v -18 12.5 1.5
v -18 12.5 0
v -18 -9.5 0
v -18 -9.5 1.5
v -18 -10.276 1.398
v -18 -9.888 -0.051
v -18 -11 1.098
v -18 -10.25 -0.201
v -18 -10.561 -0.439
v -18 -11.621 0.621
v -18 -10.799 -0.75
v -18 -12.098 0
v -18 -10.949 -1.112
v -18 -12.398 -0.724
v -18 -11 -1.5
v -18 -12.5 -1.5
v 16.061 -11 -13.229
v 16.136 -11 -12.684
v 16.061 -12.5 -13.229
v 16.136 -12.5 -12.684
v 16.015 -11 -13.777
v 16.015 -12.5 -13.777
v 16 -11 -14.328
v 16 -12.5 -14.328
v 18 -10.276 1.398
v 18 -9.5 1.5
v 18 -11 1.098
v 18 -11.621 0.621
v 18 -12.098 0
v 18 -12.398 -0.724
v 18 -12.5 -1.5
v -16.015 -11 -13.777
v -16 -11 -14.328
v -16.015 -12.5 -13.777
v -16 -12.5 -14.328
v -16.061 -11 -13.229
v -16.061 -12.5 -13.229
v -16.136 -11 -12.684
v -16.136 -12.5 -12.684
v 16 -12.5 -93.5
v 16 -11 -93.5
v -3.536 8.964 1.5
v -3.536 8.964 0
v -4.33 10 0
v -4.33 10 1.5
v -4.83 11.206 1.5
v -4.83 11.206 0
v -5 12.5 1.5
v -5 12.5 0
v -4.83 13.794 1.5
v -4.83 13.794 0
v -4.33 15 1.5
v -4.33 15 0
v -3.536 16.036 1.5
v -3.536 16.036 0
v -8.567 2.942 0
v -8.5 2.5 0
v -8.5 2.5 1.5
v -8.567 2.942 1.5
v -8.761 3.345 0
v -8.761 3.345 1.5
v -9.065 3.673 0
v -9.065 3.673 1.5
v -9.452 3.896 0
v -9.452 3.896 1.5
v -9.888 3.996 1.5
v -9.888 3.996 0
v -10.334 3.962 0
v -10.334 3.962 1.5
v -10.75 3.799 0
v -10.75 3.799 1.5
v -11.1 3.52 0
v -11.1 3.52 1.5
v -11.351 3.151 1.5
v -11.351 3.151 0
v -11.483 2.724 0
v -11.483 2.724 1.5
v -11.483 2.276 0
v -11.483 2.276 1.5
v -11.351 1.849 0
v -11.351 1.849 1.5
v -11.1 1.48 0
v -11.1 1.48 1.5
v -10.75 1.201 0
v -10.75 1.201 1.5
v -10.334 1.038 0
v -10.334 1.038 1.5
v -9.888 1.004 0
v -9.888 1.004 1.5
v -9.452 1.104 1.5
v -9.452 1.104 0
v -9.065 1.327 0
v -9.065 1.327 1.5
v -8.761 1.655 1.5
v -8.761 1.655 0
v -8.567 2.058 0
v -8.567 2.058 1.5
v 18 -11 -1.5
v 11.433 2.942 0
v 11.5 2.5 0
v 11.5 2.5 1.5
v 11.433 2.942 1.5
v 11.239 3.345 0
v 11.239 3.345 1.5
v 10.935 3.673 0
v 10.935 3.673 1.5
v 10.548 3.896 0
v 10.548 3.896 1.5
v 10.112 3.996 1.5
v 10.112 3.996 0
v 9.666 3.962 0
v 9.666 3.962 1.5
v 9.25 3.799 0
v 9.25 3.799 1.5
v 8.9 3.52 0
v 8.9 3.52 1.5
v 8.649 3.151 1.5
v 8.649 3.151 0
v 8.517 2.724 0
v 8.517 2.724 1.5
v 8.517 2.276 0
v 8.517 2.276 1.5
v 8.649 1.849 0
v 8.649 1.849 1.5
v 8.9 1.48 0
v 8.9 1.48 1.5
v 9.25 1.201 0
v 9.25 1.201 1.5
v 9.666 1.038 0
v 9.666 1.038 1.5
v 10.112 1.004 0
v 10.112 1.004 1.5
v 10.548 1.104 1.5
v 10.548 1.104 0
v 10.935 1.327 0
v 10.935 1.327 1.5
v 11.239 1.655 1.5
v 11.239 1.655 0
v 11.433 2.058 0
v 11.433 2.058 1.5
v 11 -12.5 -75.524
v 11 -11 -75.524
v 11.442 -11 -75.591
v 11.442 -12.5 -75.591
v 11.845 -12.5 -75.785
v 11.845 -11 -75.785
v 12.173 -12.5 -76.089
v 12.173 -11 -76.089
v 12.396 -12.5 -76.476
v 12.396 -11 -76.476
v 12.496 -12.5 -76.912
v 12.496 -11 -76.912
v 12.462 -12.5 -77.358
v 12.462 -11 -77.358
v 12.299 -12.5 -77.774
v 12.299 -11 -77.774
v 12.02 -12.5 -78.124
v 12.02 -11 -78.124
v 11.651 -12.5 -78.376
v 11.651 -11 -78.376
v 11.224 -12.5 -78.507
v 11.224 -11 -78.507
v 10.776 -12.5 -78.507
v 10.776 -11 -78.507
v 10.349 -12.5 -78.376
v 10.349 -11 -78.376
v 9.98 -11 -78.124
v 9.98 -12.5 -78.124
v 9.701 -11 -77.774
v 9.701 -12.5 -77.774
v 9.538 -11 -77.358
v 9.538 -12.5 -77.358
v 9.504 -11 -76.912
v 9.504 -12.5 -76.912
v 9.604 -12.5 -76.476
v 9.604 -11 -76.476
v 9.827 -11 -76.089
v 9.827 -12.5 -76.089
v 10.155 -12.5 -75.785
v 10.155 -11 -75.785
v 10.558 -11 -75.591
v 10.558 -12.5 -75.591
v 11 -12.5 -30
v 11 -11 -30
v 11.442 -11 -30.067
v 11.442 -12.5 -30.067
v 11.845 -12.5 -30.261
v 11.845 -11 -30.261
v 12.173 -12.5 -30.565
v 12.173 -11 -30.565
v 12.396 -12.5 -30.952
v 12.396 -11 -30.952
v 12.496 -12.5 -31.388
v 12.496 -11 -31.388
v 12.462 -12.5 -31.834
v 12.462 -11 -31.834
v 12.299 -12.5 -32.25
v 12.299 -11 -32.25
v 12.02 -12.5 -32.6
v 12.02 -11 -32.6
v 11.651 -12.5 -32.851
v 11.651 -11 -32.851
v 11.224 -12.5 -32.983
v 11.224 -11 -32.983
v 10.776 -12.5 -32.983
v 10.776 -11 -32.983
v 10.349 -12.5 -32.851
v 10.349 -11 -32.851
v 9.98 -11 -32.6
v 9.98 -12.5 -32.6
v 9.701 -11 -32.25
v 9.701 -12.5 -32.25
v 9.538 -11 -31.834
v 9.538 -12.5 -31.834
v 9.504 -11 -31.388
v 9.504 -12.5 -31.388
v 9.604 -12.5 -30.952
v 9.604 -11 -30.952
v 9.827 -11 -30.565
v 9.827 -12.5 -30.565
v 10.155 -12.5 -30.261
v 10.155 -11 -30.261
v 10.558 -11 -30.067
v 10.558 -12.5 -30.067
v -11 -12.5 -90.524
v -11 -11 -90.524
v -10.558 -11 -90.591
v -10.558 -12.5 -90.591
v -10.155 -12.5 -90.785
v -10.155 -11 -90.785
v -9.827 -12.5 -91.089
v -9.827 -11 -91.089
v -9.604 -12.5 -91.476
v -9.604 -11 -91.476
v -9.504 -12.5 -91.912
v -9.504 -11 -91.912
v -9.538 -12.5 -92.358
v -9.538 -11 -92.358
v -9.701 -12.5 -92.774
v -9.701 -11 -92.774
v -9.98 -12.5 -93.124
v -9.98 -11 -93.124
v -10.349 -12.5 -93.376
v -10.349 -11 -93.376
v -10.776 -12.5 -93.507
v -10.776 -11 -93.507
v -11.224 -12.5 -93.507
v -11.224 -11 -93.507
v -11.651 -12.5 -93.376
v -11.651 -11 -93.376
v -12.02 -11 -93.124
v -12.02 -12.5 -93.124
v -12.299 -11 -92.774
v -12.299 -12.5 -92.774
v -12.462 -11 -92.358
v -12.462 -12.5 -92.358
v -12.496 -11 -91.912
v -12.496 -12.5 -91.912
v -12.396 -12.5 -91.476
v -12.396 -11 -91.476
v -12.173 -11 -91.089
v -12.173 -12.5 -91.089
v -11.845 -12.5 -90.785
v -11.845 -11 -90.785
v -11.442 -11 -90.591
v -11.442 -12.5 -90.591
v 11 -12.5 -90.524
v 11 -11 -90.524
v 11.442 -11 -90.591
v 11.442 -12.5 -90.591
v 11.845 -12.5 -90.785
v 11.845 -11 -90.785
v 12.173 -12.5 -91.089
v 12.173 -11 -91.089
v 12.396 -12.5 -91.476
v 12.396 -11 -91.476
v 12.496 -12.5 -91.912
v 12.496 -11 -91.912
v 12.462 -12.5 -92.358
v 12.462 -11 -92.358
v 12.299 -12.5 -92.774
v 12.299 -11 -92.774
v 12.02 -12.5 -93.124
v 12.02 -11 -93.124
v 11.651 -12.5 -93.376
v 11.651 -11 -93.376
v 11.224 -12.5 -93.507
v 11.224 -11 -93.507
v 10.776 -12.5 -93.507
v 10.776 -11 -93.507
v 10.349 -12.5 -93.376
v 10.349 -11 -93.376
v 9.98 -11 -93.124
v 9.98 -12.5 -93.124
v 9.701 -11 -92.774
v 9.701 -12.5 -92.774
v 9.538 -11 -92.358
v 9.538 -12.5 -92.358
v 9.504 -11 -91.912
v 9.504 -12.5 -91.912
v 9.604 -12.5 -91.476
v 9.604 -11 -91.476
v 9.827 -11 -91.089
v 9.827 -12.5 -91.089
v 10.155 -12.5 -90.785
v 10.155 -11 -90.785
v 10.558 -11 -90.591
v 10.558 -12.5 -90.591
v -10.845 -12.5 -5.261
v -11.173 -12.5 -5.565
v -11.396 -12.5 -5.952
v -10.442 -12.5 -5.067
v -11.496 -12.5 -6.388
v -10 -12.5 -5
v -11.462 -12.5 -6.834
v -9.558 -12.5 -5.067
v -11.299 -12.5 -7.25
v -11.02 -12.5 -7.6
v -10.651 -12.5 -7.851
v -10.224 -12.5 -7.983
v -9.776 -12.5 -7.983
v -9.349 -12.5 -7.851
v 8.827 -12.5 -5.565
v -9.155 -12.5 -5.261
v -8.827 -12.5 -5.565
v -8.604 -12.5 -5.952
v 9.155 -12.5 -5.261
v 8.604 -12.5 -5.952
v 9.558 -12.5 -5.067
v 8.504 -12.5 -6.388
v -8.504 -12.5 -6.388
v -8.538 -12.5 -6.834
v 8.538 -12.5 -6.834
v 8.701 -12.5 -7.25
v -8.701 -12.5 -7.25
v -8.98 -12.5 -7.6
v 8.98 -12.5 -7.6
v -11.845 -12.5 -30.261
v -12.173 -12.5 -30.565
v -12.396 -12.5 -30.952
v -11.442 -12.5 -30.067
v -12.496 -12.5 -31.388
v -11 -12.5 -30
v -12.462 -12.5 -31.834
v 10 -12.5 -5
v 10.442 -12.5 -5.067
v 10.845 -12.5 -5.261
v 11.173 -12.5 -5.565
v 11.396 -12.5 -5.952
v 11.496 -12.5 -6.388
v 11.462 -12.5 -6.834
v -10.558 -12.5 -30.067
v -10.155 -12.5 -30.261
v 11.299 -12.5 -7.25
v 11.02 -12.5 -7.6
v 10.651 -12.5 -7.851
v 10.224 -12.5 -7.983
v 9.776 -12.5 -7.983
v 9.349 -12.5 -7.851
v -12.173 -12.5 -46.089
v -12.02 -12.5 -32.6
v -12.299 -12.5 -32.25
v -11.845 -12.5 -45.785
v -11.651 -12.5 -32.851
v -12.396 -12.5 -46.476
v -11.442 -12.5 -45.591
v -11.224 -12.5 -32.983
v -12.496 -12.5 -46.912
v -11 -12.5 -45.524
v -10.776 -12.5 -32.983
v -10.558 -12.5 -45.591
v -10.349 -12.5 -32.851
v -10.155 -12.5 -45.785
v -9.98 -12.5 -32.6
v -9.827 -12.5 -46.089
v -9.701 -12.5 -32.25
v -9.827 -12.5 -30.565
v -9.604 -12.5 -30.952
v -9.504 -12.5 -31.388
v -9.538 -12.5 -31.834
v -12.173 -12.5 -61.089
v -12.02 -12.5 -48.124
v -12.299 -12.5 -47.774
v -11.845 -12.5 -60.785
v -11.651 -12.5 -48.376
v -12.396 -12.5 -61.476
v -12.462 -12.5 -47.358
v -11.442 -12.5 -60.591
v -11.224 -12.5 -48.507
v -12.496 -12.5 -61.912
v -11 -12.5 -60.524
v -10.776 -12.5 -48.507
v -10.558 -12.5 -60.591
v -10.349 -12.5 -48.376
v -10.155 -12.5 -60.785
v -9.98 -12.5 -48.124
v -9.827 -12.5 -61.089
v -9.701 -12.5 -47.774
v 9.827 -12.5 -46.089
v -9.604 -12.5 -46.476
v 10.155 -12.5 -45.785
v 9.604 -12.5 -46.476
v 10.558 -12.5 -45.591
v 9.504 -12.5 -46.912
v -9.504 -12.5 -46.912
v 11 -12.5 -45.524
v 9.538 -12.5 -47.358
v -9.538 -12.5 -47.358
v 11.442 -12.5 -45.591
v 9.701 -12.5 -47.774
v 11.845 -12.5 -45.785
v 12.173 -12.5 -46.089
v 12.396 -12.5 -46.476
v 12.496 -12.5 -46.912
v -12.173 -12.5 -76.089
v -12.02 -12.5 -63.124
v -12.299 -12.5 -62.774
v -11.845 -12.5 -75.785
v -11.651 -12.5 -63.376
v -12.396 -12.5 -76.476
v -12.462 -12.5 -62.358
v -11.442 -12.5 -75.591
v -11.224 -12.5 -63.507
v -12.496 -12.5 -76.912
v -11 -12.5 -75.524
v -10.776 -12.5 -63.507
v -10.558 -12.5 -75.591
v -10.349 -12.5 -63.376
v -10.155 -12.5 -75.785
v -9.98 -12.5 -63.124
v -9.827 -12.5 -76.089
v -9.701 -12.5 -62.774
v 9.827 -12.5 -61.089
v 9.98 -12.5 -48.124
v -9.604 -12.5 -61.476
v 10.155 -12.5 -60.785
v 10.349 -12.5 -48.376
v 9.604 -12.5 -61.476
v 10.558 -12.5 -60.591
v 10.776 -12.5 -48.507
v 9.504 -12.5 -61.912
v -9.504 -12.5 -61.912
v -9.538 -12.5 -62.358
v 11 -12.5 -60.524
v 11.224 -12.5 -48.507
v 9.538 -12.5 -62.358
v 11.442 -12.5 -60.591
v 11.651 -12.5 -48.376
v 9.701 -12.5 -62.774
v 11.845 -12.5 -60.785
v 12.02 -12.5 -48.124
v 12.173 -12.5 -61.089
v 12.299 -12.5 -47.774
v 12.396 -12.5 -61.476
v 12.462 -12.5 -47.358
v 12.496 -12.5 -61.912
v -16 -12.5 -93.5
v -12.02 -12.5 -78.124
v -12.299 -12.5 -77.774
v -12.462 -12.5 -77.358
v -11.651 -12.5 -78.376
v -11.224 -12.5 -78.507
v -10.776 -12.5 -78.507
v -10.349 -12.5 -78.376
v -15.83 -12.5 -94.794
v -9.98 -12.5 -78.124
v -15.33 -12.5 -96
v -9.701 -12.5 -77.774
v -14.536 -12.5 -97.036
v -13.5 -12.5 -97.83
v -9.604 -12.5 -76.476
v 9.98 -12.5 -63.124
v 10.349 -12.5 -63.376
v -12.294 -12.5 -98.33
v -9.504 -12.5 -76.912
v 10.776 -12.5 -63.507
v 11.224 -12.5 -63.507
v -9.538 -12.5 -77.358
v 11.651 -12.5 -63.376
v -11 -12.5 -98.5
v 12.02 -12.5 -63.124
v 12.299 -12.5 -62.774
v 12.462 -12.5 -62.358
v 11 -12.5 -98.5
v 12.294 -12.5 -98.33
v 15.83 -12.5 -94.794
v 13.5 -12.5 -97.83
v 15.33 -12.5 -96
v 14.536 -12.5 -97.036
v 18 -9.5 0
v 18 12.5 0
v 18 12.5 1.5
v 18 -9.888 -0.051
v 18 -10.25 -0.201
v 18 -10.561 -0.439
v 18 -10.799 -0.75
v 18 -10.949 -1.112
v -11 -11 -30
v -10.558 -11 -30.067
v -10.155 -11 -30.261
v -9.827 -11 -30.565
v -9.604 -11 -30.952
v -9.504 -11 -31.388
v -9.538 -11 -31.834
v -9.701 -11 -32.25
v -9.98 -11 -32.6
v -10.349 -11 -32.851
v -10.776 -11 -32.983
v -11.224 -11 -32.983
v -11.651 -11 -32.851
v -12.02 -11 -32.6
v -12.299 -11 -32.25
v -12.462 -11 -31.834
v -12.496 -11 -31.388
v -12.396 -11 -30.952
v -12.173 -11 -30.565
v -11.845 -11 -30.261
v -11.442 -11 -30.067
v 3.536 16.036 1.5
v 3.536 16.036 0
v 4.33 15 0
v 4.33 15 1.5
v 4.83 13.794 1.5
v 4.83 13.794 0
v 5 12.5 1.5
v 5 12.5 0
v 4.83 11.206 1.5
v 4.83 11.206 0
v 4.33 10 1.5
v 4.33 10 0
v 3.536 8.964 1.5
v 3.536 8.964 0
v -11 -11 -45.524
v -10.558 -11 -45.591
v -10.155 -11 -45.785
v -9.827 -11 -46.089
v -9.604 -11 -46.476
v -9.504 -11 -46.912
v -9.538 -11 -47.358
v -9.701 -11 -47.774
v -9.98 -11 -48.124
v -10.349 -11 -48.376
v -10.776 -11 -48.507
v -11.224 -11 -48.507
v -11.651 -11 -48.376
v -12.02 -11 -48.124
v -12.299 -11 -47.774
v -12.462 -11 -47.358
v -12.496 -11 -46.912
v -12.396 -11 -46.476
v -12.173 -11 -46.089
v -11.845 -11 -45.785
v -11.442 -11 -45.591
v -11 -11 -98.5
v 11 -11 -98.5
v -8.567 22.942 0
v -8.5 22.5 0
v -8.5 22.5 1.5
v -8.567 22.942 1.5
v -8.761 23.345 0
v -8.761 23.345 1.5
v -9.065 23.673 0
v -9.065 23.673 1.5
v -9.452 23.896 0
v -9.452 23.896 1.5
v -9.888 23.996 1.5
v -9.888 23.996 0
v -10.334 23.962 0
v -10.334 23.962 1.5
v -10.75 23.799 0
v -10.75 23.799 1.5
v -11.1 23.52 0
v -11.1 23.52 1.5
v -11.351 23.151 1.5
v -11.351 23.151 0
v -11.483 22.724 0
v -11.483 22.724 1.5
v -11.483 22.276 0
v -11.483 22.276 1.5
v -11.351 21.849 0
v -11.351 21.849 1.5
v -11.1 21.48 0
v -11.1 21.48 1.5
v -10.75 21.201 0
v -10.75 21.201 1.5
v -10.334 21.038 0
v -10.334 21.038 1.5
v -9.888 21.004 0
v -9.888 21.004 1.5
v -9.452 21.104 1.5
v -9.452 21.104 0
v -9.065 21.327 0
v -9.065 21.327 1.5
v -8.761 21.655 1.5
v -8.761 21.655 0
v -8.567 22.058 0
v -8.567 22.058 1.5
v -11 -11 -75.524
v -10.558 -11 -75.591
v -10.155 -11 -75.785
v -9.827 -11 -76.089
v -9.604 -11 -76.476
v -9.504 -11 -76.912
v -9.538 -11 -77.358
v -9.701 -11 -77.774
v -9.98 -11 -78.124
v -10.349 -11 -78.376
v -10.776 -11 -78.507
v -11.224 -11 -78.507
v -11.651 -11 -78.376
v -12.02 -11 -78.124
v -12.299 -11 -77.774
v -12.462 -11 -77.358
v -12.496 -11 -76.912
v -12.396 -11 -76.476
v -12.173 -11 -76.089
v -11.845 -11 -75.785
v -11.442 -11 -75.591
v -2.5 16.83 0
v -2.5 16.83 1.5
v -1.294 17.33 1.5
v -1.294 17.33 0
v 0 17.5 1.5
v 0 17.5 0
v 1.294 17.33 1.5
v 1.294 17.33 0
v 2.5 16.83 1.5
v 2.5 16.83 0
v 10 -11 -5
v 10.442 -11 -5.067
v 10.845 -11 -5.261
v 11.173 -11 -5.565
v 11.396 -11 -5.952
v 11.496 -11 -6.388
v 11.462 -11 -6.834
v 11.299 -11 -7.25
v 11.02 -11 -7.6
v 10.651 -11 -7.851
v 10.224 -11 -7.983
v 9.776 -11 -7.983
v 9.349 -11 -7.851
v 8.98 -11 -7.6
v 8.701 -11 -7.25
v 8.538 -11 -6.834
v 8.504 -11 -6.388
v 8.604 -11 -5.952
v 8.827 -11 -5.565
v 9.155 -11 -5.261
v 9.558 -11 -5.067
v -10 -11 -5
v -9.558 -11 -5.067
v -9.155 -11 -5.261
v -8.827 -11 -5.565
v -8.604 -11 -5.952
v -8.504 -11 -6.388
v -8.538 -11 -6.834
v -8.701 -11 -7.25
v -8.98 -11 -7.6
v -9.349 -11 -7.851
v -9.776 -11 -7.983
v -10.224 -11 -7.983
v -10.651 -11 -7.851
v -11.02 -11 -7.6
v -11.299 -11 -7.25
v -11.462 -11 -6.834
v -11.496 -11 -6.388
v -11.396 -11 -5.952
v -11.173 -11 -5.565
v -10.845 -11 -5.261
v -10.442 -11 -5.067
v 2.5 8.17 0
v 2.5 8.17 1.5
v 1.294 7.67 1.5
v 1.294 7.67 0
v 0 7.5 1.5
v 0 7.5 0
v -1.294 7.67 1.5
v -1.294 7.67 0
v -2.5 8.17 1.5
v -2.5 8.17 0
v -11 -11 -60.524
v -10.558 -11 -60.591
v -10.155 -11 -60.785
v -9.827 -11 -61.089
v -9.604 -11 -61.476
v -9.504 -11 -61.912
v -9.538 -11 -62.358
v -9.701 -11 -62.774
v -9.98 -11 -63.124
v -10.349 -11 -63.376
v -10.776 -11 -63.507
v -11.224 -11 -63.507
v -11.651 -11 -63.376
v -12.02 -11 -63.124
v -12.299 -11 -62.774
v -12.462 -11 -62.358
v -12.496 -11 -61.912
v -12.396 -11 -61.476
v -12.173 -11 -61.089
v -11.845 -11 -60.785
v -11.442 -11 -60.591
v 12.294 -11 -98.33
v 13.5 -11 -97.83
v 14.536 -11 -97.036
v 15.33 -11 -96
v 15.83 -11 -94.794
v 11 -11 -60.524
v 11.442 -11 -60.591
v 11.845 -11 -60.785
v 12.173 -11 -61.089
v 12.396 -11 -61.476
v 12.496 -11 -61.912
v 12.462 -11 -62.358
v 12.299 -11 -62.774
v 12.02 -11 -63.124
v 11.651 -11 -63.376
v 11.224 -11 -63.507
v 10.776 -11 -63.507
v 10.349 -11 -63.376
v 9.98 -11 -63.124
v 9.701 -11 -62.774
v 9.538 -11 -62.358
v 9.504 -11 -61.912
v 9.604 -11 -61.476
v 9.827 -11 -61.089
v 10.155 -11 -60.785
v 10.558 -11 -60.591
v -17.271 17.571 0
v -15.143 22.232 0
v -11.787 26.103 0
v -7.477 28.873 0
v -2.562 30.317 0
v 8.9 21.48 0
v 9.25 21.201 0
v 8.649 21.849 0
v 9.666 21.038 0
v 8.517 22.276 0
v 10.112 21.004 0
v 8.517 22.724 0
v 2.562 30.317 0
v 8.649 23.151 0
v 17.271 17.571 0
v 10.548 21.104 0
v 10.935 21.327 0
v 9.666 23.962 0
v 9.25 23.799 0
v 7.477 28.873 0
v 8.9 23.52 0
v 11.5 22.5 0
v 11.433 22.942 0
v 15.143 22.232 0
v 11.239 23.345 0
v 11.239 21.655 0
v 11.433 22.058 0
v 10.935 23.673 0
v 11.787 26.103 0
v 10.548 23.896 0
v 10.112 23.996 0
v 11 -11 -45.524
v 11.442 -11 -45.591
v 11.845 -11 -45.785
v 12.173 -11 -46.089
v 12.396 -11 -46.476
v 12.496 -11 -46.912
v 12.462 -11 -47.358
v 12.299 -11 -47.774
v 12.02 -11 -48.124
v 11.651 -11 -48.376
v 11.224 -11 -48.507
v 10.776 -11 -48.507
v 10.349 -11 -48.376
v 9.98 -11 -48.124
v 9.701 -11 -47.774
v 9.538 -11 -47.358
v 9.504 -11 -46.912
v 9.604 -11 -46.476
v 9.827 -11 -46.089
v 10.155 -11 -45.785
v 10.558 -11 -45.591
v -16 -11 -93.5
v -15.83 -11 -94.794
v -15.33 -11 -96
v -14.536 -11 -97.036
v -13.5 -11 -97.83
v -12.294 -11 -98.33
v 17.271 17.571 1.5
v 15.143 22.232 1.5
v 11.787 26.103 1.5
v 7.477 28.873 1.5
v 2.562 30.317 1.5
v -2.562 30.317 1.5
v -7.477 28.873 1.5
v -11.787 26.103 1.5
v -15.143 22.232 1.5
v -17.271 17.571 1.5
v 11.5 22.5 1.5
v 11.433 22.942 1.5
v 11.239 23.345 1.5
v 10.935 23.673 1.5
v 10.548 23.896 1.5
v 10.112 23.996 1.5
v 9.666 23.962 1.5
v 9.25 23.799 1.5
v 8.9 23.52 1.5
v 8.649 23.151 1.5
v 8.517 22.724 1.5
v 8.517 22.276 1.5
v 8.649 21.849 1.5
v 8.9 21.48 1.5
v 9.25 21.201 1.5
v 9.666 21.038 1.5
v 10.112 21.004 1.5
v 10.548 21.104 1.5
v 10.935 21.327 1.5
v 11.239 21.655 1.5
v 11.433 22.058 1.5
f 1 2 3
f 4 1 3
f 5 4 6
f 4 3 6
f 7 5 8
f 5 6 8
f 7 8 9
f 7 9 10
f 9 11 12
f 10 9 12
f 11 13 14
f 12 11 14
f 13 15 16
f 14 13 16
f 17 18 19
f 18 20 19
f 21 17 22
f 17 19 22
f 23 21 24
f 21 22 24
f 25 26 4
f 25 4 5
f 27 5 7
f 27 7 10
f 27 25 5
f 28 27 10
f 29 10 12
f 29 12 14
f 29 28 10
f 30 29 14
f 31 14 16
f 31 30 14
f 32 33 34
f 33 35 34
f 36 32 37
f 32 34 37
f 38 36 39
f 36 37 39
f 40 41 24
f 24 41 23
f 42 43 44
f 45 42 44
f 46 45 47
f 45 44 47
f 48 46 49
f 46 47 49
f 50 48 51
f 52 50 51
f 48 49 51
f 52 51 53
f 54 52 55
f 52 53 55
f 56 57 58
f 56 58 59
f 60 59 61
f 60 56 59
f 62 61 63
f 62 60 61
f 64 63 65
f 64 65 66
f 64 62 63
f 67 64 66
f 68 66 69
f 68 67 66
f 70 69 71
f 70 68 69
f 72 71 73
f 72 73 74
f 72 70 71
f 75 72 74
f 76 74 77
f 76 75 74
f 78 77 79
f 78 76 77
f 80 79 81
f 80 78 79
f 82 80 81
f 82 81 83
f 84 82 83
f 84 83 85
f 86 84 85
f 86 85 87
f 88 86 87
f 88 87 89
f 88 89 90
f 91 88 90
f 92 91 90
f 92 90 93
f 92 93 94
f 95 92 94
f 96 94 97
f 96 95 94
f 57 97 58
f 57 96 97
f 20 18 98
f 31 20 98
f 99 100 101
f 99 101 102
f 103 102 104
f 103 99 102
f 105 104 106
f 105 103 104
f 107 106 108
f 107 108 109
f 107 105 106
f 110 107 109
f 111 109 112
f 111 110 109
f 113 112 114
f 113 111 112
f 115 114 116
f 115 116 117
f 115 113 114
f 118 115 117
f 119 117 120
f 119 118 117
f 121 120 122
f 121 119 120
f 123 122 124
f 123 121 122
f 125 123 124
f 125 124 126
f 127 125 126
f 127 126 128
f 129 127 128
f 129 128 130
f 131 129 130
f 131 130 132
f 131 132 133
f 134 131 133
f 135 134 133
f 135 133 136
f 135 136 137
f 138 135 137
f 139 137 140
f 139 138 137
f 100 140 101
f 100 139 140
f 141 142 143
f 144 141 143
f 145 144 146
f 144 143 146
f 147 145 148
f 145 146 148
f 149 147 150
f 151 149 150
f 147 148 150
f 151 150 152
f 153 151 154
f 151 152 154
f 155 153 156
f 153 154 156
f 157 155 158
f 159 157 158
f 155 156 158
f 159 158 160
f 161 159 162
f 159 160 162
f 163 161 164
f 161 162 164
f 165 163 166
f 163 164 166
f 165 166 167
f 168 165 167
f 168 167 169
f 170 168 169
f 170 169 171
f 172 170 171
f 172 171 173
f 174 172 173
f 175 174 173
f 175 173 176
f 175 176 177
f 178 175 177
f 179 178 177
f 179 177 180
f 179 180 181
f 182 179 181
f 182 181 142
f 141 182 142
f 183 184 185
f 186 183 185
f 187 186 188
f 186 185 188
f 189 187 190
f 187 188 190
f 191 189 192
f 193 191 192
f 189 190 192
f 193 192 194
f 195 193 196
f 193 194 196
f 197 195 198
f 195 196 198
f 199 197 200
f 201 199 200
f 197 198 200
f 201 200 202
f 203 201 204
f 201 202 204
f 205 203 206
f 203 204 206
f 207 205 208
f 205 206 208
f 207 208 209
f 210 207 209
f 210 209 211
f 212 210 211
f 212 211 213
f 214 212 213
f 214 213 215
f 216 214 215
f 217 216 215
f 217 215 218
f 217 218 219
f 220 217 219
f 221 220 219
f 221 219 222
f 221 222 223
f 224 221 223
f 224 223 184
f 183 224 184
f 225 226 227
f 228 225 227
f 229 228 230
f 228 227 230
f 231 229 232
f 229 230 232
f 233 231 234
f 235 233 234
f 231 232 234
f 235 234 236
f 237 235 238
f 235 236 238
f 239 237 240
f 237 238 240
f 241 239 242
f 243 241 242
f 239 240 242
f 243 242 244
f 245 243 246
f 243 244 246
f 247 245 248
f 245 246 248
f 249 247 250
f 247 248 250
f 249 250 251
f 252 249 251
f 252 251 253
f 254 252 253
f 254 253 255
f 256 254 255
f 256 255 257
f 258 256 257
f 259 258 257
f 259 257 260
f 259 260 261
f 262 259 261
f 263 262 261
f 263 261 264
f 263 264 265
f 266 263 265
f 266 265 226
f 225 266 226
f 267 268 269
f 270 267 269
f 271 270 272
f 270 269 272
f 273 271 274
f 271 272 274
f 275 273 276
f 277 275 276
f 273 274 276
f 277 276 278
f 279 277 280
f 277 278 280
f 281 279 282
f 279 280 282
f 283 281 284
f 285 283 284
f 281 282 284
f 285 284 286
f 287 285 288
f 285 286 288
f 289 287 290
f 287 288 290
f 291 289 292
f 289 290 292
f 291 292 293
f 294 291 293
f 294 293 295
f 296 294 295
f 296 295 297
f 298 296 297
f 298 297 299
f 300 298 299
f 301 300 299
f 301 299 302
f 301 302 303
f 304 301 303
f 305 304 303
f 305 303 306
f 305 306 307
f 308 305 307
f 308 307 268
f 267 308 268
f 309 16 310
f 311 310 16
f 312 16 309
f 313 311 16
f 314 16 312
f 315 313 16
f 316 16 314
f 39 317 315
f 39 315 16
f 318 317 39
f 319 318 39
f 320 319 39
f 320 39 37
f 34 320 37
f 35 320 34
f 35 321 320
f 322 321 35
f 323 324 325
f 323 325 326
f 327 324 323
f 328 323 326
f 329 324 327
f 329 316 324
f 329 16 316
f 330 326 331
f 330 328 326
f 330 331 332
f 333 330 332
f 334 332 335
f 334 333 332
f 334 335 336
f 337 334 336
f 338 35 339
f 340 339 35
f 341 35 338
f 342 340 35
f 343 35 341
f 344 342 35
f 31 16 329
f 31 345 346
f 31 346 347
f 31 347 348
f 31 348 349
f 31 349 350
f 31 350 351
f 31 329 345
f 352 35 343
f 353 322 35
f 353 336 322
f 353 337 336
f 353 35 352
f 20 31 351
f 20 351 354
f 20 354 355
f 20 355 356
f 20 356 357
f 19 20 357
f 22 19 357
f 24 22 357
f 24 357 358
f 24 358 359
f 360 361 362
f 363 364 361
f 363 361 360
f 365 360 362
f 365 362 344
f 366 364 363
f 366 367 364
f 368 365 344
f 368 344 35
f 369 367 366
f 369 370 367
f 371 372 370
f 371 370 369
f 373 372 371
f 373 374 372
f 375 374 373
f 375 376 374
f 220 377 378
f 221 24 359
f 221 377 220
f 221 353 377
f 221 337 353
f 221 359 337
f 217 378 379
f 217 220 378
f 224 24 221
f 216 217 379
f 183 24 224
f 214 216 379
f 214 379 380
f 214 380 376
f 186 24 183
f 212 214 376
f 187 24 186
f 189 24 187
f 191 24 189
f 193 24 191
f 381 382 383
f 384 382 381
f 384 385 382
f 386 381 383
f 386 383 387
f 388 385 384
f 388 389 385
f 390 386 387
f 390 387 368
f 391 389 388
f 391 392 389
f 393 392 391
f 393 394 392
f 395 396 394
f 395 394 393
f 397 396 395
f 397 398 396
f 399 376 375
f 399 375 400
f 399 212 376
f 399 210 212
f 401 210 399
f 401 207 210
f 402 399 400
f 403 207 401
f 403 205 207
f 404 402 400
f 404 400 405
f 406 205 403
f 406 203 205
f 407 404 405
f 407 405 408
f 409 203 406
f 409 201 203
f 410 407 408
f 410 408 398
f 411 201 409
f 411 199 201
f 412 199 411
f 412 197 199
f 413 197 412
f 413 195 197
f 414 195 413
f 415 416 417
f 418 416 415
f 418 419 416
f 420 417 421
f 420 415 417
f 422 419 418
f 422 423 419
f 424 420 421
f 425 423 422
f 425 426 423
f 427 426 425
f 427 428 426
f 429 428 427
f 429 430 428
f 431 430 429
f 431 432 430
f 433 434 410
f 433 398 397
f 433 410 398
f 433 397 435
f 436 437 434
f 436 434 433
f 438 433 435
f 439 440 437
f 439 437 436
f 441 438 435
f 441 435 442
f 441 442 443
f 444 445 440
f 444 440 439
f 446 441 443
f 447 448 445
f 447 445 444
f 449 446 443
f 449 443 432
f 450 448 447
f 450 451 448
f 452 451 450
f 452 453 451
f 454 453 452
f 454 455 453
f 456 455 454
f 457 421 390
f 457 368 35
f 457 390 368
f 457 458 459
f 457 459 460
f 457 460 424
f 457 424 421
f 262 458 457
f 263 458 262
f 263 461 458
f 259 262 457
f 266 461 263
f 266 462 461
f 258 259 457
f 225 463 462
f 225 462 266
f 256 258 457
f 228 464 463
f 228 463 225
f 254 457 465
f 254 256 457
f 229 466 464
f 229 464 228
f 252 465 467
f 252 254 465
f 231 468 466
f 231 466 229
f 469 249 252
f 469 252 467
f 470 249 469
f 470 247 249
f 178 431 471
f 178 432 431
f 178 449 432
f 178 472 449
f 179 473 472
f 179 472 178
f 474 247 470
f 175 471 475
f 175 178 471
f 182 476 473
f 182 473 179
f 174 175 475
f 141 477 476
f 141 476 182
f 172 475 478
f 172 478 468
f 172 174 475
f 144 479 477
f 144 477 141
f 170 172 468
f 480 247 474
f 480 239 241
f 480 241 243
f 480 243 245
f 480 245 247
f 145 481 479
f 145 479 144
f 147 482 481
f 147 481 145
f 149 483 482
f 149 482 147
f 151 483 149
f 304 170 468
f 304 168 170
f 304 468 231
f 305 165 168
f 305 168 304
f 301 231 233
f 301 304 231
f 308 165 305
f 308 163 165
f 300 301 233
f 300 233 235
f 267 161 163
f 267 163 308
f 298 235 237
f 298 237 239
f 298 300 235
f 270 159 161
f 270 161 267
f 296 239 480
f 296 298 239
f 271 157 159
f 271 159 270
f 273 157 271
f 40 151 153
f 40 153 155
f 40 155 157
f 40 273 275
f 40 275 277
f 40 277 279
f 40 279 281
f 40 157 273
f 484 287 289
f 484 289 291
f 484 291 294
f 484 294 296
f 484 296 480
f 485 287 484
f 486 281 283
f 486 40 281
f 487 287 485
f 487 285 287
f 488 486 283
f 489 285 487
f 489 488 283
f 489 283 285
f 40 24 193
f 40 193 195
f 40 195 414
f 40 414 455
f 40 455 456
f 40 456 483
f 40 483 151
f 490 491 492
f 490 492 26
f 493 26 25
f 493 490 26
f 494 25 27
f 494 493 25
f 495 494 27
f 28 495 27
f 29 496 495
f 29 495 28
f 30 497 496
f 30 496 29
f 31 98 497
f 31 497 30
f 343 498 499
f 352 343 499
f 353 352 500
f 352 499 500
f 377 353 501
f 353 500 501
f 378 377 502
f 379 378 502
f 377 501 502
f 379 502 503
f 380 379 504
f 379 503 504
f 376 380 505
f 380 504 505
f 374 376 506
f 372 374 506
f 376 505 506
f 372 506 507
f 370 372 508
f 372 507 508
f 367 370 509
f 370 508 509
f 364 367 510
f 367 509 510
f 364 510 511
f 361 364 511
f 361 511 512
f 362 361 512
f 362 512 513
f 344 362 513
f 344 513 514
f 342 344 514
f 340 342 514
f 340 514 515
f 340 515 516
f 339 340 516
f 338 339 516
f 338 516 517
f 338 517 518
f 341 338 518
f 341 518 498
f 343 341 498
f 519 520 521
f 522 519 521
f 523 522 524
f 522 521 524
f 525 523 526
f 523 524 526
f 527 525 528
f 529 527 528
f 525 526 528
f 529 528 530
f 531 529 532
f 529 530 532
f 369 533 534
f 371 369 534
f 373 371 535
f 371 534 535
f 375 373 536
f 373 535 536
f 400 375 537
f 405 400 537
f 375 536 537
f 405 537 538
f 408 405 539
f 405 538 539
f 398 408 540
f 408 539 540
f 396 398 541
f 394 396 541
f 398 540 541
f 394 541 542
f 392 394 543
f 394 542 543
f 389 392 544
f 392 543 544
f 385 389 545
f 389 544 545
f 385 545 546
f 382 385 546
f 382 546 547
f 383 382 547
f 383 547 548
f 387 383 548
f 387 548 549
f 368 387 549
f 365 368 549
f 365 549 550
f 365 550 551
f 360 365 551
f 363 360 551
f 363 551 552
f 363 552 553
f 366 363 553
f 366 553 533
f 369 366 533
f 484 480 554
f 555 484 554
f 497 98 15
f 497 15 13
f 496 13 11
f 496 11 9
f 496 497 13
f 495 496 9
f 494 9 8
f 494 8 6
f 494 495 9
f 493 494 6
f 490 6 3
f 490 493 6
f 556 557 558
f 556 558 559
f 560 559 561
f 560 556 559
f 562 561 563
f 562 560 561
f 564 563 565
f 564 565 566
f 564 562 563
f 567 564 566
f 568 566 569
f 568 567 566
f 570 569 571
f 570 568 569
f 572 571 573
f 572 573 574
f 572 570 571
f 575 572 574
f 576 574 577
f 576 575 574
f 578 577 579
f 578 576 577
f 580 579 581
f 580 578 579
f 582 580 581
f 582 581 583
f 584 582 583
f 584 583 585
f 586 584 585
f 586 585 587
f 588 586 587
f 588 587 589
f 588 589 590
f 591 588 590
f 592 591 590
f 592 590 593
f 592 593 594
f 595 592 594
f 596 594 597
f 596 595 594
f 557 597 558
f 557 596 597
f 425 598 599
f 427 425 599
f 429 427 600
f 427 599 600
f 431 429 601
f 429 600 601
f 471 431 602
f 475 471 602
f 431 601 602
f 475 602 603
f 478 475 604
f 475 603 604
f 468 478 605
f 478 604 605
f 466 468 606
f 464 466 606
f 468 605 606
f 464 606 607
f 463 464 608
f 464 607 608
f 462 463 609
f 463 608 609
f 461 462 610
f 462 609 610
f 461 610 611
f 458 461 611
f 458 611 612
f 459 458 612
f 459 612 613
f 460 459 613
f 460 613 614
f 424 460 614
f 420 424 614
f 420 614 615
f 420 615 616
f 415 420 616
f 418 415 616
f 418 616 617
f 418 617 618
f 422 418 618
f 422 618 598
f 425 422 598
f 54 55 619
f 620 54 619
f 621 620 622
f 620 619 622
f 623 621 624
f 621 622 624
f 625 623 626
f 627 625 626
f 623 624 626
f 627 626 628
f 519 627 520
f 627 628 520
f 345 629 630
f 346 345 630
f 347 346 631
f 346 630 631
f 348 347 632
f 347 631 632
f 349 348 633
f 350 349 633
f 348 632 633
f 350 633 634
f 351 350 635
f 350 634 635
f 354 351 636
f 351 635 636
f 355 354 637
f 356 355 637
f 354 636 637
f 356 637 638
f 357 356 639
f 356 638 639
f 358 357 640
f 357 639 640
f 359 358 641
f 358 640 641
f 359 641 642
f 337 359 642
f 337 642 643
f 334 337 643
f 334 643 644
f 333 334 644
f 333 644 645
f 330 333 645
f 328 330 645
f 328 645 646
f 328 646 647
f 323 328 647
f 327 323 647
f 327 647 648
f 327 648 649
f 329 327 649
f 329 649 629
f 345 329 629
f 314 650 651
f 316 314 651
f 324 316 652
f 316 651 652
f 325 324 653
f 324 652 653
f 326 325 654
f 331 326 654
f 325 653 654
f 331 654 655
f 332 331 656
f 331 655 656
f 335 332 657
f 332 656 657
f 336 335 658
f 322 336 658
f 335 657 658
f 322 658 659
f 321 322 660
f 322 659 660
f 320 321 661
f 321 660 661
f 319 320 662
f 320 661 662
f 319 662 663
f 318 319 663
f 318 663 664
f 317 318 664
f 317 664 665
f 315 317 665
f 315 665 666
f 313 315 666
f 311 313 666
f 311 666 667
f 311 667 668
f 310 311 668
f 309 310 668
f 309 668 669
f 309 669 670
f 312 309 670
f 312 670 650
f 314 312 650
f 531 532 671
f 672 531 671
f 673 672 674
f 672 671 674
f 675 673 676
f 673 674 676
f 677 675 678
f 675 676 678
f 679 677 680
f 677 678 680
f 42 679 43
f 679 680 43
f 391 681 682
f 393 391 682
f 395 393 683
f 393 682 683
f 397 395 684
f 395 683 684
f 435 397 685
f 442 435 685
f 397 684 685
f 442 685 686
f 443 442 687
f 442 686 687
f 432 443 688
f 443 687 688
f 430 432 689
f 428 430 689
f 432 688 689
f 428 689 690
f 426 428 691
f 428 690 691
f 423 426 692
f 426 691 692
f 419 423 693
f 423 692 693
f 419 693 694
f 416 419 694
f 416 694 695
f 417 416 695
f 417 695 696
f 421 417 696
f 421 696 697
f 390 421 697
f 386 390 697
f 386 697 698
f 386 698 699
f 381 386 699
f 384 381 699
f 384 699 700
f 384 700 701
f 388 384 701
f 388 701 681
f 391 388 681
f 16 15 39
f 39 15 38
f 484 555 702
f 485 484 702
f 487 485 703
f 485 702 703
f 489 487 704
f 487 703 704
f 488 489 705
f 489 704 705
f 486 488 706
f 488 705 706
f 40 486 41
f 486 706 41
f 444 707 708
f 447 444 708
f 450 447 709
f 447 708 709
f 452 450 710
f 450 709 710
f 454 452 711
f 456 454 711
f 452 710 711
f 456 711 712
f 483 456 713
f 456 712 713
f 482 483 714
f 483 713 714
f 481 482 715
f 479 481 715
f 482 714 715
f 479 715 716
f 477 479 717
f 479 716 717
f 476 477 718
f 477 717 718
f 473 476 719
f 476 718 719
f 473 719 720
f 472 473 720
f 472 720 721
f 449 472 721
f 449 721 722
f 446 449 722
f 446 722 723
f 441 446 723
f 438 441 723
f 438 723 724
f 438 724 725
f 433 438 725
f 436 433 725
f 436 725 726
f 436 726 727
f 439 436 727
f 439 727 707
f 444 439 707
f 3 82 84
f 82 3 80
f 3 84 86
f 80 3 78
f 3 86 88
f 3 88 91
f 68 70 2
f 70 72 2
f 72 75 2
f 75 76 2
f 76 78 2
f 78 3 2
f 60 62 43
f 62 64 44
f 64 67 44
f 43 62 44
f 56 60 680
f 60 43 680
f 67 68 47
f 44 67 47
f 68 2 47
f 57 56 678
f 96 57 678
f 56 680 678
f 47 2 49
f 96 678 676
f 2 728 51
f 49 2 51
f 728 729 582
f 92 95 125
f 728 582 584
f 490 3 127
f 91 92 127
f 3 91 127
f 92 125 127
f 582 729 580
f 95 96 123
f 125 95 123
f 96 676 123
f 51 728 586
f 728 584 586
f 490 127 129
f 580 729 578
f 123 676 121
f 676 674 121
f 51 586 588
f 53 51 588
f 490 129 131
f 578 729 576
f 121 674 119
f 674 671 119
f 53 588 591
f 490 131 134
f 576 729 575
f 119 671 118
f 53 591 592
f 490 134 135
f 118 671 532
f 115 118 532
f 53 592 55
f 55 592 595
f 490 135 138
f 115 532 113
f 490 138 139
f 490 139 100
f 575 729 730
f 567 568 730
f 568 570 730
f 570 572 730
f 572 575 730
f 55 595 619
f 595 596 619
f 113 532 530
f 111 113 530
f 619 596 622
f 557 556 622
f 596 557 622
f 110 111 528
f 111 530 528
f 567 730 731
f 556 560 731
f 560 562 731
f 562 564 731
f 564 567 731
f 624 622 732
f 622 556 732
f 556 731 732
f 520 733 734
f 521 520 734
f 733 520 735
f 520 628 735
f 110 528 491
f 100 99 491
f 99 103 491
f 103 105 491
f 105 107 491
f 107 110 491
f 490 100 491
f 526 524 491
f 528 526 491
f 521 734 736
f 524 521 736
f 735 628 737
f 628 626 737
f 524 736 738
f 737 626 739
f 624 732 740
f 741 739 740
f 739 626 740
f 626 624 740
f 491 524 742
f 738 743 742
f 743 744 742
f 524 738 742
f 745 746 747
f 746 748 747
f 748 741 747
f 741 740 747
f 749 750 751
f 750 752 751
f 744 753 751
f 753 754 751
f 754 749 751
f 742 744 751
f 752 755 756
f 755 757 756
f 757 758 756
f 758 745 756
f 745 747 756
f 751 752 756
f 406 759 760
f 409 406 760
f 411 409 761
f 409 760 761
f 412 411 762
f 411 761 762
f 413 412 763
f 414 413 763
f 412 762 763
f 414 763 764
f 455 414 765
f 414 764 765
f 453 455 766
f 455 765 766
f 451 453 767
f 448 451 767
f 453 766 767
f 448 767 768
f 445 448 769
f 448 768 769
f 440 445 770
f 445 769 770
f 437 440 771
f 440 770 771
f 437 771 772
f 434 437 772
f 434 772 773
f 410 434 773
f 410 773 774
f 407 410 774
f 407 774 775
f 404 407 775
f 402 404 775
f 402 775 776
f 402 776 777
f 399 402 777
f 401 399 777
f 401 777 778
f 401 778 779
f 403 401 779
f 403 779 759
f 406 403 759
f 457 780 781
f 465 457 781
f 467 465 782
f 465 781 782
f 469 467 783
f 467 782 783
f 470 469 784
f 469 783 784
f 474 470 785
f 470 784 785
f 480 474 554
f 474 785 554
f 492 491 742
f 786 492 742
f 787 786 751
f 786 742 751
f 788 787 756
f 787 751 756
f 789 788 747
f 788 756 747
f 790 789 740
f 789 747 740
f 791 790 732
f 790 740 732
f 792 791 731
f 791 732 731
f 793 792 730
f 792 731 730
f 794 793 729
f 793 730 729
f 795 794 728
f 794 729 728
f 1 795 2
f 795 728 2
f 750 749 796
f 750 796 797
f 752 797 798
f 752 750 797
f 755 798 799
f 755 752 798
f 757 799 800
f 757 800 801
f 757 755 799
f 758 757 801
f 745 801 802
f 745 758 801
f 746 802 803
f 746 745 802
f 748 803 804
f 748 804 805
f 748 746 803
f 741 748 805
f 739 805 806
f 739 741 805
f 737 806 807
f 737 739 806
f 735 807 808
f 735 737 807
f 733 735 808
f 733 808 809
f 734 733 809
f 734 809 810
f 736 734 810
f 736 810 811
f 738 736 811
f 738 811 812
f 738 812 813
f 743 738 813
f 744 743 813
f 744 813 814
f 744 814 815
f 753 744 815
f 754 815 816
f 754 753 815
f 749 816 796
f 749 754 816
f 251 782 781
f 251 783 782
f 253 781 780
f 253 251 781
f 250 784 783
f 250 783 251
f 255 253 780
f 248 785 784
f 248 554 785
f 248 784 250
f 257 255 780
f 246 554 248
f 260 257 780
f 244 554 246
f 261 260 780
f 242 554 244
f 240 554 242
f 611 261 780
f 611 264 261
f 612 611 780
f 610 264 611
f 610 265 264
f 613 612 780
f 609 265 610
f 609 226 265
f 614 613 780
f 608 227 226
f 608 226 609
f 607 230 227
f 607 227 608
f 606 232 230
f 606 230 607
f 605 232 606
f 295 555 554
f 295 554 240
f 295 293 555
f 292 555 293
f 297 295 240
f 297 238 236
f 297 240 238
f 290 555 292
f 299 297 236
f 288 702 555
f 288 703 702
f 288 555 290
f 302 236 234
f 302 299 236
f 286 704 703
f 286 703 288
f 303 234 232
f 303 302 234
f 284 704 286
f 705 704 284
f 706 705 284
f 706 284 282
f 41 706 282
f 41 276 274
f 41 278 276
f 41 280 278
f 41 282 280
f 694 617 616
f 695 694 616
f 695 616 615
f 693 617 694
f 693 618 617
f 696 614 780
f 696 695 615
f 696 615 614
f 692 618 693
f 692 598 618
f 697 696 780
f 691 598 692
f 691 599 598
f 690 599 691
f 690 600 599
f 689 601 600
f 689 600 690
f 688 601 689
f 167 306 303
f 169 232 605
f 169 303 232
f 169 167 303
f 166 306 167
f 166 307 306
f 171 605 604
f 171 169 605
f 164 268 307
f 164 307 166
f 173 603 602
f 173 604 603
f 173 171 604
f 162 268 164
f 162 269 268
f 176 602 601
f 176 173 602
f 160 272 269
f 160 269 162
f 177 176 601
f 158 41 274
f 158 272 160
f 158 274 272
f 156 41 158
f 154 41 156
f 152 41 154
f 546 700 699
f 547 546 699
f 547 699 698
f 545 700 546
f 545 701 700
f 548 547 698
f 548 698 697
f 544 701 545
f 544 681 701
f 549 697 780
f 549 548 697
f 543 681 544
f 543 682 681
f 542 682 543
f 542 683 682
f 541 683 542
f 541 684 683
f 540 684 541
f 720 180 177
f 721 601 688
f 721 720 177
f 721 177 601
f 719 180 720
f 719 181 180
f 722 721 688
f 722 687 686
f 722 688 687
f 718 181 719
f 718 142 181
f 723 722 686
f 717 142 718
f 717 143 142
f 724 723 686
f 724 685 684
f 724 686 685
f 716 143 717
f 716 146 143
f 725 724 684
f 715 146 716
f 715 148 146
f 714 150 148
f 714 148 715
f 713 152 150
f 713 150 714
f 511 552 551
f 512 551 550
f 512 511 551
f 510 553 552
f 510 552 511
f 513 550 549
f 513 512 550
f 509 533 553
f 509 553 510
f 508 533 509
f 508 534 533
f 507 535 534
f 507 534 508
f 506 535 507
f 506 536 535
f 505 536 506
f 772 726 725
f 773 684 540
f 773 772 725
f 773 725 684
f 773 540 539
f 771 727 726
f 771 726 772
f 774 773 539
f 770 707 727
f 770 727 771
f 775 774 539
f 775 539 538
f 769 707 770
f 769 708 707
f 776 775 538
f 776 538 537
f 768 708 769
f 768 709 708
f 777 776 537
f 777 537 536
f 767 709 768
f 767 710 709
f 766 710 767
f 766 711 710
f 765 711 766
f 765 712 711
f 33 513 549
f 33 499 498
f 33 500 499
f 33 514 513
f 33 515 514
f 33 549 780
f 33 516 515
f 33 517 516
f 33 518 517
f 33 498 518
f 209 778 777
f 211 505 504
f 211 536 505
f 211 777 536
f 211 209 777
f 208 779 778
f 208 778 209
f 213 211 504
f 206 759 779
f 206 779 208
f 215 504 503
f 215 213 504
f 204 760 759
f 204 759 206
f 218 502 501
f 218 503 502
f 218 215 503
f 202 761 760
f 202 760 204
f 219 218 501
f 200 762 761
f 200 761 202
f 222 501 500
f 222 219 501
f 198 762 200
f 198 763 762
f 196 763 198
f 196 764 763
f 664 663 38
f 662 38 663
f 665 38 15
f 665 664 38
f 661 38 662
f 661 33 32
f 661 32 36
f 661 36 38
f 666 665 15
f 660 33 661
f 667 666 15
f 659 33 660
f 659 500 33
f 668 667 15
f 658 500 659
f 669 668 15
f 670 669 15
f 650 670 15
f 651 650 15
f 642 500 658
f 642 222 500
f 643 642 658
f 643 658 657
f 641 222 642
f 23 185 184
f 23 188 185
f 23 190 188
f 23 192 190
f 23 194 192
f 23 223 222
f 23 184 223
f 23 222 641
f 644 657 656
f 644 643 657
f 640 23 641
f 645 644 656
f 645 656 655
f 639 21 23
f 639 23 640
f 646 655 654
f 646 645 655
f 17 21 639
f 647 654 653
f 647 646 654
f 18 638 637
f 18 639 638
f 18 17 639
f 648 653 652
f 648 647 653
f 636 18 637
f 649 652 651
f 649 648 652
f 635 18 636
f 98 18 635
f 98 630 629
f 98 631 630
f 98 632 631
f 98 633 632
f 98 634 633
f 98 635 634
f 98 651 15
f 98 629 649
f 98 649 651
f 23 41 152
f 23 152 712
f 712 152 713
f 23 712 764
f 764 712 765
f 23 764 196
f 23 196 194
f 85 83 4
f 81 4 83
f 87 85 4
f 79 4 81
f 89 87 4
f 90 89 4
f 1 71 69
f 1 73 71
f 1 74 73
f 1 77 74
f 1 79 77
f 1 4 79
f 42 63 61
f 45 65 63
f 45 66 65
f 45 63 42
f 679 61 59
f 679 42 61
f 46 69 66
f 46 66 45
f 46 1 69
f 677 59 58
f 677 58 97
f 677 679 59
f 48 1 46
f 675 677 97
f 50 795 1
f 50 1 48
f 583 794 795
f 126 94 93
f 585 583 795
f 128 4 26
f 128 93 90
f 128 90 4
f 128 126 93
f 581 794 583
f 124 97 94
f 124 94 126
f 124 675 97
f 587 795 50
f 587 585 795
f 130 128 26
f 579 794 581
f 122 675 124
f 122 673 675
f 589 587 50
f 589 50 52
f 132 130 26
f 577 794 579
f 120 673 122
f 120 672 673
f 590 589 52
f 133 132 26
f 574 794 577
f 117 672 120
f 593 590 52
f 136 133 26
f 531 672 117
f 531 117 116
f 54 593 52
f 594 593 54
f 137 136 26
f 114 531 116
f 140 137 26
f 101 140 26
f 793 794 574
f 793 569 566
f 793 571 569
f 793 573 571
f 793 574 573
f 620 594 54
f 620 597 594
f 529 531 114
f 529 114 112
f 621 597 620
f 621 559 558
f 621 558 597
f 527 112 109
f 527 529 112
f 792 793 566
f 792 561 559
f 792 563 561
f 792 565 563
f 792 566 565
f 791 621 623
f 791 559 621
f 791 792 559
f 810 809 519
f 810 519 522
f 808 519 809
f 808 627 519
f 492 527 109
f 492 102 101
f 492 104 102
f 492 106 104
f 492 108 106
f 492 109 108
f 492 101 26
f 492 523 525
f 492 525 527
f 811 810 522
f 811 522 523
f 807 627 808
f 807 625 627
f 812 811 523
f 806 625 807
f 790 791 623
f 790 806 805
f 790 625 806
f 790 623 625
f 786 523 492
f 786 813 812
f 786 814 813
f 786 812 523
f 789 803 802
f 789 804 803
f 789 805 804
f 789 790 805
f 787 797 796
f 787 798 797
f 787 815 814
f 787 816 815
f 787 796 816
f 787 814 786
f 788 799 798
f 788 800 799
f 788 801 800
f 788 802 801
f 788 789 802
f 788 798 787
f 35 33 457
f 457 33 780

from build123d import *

# Parameters (mm, degrees)
SKETCH2_R                    = 1.5
BOSS_EXTRUDE1_DEPTH          = 1.5
EDGE_FLANGE1_STRIP_W         = 9
EDGE_FLANGE1_STRIP_H         = 1.5
EDGE_FLANGE1_STRIP_CUT_DEPTH = 36
EDGE_FLANGE1_DEPTH           = 36
CUT_EXTRUDE1_DEPTH           = 1.5
FILLET1_R                    = 10
SKETCH12_R                   = 1.5
CUT_EXTRUDE2_DEPTH           = 15


# Sheet-metal steps are written as plain solids
with BuildPart() as part:
    # Sketch2 → Boss-Extrude1 (new body)
    with BuildSketch(Plane.XY):
        with BuildLine():
            ThreePointArc((18, 12.5), (0, 30.5), (-18, 12.5))
            Line((-18, 12.5), (-18, -12.5))
            Line((-18, -12.5), (18, -12.5))
            Line((18, -12.5), (18, 12.5))
        make_face()
        with Locations((-10, 2.5)):
            Circle(SKETCH2_R, mode=Mode.SUBTRACT)
        with BuildLine():
            ThreePointArc((-3.535533906, 16.035533906), (0, 17.5), (3.535533906, 16.035533906))
            ThreePointArc((3.535533906, 16.035533906), (5, 12.5), (3.535533906, 8.964466094))
            ThreePointArc((3.535533906, 8.964466094), (0, 7.5), (-3.535533906, 8.964466094))
            ThreePointArc((-3.535533906, 8.964466094), (-5, 12.5), (-3.535533906, 16.035533906))
        make_face(mode=Mode.SUBTRACT)
        with Locations((10, 2.5)):
            Circle(SKETCH2_R, mode=Mode.SUBTRACT)
        with Locations((-10, 22.5)):
            Circle(SKETCH2_R, mode=Mode.SUBTRACT)
        with Locations((10, 22.5)):
            Circle(SKETCH2_R, mode=Mode.SUBTRACT)
    extrude(amount=BOSS_EXTRUDE1_DEPTH)

    # Edge-Flange1 strip (across the edge) → Edge-Flange1 strip cut (cut)
    with BuildSketch(Plane(origin=(18, -12.5, 0), x_dir=(0, 1, 0), z_dir=(-1, 0, 0))):
        with Locations((-1.5, -0.75)):
            Rectangle(EDGE_FLANGE1_STRIP_W, EDGE_FLANGE1_STRIP_H)
    extrude(amount=EDGE_FLANGE1_STRIP_CUT_DEPTH, mode=Mode.SUBTRACT)

    # Edge-Flange1 section (across the edge) → Edge-Flange1 (add)
    with BuildSketch(Plane(origin=(18, -12.5, 0), x_dir=(0, 1, 0), z_dir=(-1, 0, 0))):
        with BuildLine():
            Line((0, 1.5), (0, 98.5))
            Line((0, 98.5), (1.5, 98.5))
            Line((1.5, 98.5), (1.5, 1.5))
            ThreePointArc((1.5, 1.5), (1.939339828, 0.439339828), (3, 0))
            Line((3, 0), (3, -1.5))
            ThreePointArc((3, -1.5), (0.878679656, -0.621320344), (0, 1.5))
        make_face()
    extrude(amount=EDGE_FLANGE1_DEPTH)

    # Sketch11 → Cut-Extrude1 (cut)
    with BuildSketch(Plane(origin=(0, -11, 0), x_dir=(1, 0, 0), z_dir=(0, 1, 0))):
        with BuildLine():
            Line((-18, 98.5), (-18, 1.5))
            Line((-18, 1.5), (-16, 13.5))
            Line((-16, 13.5), (-16, 93.5))
            ThreePointArc((-16, 93.5), (-14.535533906, 97.035533906), (-11, 98.5))
            Line((-11, 98.5), (-18, 98.5))
        make_face()
        with BuildLine():
            Line((16, 13.5), (18, 1.5))
            Line((18, 1.5), (18, 98.5))
            Line((18, 98.5), (11, 98.5))
            ThreePointArc((11, 98.5), (14.535533906, 97.035533906), (16, 93.5))
            Line((16, 93.5), (16, 13.5))
        make_face()
    extrude(amount=-CUT_EXTRUDE1_DEPTH, mode=Mode.SUBTRACT)

    # Fillet1
    fillet1_edges = [part.edges().sort_by_distance(p)[0] for p in [
        (-16, -11.75, -13.5),
        (16, -11.75, -13.5),
    ]]
    fillet(fillet1_edges, radius=FILLET1_R)

    # Sketch12 → Cut-Extrude2 (cut)
    with BuildSketch(Plane(origin=(0, -11, 0), x_dir=(1, 0, 0), z_dir=(0, 1, 0))):
        with Locations(Location((-10, 6.5, 0), (0, 0, 270))):
            Circle(SKETCH12_R)
        with Locations(Location((-11, 31.5, 0), (0, 0, 270))):
            Circle(SKETCH12_R)
        with Locations(Location((-11, 47.024174696, 0), (0, 0, 270))):
            Circle(SKETCH12_R)
        with Locations(Location((-11, 62.024174696, 0), (0, 0, 270))):
            Circle(SKETCH12_R)
        with Locations(Location((-11, 77.024174696, 0), (0, 0, 270))):
            Circle(SKETCH12_R)
        with Locations(Location((-11, 92.024174696, 0), (0, 0, 270))):
            Circle(SKETCH12_R)
        with Locations(Location((11, 92.024174696, 0), (0, 0, 270))):
            Circle(SKETCH12_R)
        with Locations(Location((11, 77.024174696, 0), (0, 0, 270))):
            Circle(SKETCH12_R)
        with Locations(Location((11, 62.024174696, 0), (0, 0, 270))):
            Circle(SKETCH12_R)
        with Locations(Location((11, 47.024174696, 0), (0, 0, 270))):
            Circle(SKETCH12_R)
        with Locations(Location((11, 31.5, 0), (0, 0, 270))):
            Circle(SKETCH12_R)
        with Locations(Location((10, 6.5, 0), (0, 0, 270))):
            Circle(SKETCH12_R)
    extrude(amount=-CUT_EXTRUDE2_DEPTH, mode=Mode.SUBTRACT)


solid = part.part
